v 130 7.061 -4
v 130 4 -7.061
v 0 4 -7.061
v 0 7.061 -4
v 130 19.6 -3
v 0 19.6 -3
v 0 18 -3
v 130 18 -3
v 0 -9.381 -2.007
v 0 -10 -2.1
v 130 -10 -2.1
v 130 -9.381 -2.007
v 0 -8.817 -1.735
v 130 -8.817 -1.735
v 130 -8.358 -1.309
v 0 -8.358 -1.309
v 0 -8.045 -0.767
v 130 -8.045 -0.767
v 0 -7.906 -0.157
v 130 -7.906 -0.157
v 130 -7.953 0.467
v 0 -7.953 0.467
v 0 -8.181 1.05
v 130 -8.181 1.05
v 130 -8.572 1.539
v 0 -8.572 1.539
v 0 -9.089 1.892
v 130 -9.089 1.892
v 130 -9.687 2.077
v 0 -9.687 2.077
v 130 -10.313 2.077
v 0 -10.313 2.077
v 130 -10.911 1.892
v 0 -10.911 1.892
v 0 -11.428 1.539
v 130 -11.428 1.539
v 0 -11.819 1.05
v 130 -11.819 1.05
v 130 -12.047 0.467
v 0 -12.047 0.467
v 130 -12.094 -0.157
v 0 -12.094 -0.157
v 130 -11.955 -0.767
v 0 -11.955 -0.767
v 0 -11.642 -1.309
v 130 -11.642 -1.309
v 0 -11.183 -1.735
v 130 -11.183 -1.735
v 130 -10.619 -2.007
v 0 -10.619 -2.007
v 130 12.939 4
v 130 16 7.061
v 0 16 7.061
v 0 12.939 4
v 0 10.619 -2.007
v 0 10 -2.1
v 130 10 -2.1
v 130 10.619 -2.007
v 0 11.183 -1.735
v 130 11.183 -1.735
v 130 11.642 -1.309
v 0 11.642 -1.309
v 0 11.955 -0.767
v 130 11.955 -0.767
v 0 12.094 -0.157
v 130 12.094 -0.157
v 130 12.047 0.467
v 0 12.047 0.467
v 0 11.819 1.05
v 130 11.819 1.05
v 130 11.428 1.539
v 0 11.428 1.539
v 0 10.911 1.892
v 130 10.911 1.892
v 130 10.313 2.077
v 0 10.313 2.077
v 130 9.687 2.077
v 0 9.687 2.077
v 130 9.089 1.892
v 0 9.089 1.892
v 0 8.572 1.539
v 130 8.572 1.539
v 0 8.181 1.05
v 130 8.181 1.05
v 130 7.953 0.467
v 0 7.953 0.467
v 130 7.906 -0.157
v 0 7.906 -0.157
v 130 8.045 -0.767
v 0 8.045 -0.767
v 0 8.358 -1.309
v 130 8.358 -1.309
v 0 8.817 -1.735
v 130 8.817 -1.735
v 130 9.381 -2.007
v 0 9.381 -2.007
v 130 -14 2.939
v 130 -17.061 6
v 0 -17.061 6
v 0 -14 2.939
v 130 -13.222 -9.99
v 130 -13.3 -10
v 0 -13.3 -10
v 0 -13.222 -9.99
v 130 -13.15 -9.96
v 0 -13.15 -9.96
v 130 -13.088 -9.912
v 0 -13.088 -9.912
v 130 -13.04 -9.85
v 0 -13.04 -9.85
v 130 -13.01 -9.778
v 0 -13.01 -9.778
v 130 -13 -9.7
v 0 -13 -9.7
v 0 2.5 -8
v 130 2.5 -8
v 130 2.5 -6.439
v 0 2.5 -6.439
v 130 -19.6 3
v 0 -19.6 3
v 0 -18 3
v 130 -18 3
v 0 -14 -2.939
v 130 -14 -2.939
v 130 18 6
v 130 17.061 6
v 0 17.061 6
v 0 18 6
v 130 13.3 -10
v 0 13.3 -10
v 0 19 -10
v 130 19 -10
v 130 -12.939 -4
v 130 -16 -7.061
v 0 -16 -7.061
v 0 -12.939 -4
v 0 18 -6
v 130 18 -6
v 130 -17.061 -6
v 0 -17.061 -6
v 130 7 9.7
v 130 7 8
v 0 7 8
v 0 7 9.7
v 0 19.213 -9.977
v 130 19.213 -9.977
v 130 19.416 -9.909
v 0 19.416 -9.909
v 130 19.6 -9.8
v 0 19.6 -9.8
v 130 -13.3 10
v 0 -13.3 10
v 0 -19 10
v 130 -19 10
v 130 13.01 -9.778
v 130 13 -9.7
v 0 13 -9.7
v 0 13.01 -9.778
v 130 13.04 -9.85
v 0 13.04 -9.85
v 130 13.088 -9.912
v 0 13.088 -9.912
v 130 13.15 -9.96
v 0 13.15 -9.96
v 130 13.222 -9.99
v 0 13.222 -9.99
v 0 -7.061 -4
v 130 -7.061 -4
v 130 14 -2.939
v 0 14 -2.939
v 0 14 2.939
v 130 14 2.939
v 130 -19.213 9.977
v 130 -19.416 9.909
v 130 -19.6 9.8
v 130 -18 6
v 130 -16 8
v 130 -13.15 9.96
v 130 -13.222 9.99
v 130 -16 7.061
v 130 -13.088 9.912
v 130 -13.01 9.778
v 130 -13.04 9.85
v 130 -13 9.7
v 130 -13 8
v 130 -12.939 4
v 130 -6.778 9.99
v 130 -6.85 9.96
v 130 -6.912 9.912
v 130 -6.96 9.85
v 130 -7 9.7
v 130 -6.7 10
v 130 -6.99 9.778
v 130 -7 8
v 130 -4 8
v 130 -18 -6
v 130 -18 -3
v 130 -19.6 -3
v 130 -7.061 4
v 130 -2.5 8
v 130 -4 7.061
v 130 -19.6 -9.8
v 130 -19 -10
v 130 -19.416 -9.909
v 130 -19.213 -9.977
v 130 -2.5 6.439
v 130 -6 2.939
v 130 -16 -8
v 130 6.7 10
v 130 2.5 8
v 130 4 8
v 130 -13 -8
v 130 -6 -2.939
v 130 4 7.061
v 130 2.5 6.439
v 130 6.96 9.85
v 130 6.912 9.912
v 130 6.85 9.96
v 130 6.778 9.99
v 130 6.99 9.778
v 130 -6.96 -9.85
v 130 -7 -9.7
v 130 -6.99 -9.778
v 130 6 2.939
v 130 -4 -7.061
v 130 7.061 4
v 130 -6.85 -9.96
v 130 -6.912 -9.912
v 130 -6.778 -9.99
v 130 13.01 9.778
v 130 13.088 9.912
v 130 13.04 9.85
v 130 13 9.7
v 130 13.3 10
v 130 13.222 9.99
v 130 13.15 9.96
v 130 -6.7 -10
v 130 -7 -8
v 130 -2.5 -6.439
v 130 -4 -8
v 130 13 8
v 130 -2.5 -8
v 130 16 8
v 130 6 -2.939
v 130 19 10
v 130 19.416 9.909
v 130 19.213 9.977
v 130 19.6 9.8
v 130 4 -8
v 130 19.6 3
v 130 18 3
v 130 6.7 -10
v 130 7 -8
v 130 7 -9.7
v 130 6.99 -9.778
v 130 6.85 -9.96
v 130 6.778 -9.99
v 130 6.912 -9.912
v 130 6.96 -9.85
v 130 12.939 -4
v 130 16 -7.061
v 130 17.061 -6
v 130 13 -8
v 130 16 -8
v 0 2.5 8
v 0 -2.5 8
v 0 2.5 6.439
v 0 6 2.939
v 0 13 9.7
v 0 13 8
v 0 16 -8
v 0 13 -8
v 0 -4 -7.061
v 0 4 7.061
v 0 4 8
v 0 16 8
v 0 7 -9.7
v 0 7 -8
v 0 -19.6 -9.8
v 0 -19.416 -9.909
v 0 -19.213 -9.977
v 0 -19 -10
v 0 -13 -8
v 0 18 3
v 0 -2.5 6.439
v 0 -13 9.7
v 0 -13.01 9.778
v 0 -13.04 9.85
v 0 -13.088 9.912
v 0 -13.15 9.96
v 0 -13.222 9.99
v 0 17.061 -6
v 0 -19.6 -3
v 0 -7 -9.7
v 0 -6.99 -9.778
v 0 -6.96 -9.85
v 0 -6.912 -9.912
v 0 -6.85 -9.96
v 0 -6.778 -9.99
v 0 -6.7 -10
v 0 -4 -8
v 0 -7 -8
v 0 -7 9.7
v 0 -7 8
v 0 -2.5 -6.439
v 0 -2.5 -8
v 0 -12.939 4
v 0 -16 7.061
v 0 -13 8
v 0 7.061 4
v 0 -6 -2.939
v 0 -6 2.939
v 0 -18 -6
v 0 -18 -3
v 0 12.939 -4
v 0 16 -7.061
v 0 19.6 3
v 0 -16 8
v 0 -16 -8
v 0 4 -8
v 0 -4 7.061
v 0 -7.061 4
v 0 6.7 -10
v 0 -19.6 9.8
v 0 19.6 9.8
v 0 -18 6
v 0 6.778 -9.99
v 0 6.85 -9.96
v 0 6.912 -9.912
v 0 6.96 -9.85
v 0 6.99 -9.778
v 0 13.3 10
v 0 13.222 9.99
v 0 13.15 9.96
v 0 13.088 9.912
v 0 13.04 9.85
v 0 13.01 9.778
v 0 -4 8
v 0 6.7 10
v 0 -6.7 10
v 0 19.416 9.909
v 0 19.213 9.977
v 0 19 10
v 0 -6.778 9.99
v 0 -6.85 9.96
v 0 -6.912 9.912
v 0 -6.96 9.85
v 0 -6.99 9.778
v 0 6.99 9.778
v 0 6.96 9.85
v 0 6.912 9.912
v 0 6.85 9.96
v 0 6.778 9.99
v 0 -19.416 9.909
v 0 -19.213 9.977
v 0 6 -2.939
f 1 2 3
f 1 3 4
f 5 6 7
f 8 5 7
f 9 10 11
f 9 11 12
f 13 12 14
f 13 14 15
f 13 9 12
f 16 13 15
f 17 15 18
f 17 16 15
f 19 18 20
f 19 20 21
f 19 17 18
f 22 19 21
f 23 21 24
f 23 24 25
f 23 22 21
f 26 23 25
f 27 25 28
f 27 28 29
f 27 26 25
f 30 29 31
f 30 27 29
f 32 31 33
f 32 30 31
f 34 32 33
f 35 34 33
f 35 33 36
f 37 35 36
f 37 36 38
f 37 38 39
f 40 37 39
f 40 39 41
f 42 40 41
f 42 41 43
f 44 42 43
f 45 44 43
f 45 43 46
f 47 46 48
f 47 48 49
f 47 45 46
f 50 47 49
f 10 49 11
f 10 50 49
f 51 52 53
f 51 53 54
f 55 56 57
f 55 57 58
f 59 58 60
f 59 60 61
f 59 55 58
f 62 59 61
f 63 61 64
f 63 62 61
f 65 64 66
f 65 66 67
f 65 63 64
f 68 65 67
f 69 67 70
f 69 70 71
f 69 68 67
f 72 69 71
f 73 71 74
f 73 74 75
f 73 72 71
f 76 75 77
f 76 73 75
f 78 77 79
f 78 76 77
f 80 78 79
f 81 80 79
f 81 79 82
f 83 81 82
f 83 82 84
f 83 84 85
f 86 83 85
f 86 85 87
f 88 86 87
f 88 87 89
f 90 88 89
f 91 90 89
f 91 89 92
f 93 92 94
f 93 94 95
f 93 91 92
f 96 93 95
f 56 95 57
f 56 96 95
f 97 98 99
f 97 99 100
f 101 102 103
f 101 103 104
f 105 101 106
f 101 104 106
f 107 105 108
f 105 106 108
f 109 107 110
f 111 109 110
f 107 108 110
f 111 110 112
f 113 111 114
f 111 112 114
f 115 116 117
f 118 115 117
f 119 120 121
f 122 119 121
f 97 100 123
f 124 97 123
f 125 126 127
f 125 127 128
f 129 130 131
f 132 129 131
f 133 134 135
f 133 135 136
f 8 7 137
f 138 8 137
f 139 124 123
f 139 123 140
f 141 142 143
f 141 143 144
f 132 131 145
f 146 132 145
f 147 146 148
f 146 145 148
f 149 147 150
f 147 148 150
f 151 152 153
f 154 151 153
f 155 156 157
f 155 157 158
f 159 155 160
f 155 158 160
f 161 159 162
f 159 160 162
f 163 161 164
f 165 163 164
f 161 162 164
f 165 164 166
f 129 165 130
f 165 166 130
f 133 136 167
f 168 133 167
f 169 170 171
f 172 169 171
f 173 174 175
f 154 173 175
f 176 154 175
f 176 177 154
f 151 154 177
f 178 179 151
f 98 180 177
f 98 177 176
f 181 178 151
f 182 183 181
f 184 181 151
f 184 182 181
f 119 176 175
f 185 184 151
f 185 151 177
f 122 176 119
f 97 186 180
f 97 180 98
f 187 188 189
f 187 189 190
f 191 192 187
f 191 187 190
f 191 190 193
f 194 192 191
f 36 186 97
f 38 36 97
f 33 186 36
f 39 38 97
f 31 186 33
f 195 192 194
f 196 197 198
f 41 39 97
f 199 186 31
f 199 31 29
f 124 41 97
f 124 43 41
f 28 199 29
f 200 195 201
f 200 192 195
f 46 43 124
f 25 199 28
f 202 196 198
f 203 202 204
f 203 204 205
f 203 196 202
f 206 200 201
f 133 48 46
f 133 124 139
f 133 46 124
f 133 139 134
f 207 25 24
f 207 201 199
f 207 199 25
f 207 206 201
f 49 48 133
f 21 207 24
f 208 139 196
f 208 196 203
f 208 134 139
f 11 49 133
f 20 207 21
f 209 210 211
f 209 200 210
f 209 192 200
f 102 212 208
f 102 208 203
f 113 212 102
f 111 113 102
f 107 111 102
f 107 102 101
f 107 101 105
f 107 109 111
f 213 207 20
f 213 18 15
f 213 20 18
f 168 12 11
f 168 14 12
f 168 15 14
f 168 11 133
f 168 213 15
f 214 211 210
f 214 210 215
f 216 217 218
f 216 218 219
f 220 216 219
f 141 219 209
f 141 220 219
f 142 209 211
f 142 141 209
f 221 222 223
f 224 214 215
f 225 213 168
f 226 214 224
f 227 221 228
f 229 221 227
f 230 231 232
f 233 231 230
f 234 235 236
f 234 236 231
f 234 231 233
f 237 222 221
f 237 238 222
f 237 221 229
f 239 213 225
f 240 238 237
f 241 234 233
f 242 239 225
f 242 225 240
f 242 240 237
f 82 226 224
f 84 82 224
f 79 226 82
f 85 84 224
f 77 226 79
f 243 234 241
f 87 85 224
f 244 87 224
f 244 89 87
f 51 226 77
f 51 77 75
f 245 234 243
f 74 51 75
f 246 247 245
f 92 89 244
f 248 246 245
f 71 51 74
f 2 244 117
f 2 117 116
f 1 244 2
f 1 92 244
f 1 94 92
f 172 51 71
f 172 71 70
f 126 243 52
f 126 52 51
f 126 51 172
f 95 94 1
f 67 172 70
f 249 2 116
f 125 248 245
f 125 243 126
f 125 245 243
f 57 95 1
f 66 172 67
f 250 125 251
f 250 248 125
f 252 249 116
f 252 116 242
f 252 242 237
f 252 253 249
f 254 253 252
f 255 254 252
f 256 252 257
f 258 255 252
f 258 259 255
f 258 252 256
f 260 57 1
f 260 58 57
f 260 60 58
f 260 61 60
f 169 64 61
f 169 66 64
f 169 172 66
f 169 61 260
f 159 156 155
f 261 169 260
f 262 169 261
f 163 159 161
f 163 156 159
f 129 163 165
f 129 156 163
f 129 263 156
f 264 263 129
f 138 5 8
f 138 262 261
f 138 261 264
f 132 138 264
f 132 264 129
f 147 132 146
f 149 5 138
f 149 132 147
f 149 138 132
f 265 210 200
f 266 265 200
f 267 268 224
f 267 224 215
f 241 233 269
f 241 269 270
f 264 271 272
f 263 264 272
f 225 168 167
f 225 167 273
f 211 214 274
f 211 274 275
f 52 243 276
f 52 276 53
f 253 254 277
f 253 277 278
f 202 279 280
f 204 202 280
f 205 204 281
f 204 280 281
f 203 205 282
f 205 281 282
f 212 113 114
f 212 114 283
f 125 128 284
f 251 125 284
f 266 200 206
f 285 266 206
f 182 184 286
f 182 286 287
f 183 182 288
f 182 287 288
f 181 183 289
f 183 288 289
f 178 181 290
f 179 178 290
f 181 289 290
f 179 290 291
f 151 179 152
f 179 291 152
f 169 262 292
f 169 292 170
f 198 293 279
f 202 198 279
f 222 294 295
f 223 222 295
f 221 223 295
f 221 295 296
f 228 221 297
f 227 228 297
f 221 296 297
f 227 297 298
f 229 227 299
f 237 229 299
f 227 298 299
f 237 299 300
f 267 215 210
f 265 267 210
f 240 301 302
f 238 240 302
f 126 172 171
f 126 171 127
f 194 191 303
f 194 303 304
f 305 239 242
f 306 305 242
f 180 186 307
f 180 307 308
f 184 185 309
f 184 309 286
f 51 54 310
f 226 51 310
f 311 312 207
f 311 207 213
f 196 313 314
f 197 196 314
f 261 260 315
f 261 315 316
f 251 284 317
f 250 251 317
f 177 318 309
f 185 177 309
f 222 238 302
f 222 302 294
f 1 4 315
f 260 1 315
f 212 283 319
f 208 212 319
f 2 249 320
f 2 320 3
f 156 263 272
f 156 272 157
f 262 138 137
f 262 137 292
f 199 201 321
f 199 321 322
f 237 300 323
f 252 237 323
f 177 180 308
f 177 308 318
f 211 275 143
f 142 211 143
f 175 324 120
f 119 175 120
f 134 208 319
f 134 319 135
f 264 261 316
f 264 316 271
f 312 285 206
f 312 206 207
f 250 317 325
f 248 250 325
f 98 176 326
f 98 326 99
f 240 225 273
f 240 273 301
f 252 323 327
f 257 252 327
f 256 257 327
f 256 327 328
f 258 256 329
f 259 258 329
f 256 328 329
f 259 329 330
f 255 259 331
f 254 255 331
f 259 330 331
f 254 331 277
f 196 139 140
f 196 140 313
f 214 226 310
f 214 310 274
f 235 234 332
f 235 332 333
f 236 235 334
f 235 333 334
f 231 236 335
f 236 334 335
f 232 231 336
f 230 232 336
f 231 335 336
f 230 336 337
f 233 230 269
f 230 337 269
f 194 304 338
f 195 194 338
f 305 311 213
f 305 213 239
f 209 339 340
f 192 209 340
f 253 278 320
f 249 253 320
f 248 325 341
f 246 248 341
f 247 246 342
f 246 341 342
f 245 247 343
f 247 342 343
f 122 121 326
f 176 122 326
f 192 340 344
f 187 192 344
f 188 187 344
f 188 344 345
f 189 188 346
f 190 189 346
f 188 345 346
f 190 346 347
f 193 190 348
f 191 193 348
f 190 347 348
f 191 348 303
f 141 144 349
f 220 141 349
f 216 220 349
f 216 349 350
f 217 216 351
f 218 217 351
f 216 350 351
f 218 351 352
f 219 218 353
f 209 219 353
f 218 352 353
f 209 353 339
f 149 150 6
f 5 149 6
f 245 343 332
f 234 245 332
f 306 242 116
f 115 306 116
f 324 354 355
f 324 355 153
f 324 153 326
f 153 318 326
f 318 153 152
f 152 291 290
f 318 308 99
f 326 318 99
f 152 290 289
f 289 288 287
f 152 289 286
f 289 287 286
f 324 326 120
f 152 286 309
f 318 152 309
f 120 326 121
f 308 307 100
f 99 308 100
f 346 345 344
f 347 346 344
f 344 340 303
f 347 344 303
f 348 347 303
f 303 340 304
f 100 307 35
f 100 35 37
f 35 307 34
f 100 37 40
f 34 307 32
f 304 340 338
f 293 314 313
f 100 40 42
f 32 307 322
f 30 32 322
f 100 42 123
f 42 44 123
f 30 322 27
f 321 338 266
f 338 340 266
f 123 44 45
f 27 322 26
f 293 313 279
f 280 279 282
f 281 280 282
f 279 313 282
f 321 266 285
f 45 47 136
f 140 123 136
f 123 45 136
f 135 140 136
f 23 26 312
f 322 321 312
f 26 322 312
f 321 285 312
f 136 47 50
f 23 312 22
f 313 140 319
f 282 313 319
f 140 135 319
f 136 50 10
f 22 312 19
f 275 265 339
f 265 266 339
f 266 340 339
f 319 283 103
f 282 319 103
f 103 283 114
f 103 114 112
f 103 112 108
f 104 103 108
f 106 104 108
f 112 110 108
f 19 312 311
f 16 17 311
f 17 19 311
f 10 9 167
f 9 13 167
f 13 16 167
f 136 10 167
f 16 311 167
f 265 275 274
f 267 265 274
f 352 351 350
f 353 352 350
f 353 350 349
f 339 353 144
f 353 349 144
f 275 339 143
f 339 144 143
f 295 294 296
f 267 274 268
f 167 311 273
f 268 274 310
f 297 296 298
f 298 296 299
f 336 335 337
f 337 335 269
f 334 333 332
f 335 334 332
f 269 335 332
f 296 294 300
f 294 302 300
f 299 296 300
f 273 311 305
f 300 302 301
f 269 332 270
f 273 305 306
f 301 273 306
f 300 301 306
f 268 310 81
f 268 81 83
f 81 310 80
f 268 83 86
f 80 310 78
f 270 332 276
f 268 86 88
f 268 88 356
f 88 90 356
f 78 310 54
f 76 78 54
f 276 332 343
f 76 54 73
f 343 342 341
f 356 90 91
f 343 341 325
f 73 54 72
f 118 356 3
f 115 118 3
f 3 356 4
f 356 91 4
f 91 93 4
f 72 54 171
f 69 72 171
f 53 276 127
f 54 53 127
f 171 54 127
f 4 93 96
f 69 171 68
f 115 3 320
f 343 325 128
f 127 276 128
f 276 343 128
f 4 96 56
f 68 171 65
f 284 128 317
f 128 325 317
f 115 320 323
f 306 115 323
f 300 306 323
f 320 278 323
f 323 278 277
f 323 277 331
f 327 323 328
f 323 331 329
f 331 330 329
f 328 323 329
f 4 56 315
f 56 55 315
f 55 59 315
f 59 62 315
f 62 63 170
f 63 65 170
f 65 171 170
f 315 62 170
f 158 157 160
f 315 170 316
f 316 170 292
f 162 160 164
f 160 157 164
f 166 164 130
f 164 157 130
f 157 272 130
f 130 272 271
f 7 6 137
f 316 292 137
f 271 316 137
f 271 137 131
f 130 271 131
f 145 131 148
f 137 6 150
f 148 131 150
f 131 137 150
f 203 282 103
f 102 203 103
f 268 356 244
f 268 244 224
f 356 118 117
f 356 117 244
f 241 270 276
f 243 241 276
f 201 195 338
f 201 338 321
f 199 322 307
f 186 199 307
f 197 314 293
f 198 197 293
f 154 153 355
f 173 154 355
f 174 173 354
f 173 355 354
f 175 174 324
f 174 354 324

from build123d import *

# Parameters (mm, degrees)
SKETCH_1_R                   = 2.1
SERI_5_20_40_20X40S5_2_DEPTH = 130


with BuildPart() as part:
    # 草图1 → Seri 5 (20,40) 20X40S5(2) (new body)
    with BuildSketch(Plane(origin=(0, 0, 0), x_dir=(0, 0, -1), z_dir=(1, 0, 0))):
        with BuildLine():
            Line((-10, 19), (-10, 13.3))
            ThreePointArc((-10, 13.3), (-9.912132034, 13.087867966), (-9.7, 13))
            Line((-9.7, 13), (-8, 13))
            Line((-8, 13), (-8, 16))
            Line((-8, 16), (-7.060660172, 16))
            Line((-7.060660172, 16), (-4, 12.939339828))
            Line((-4, 12.939339828), (-4, 7.060660172))
            Line((-4, 7.060660172), (-7.060660172, 4))
            Line((-7.060660172, 4), (-8, 4))
            Line((-8, 4), (-8, 7))
            Line((-8, 7), (-9.7, 7))
            ThreePointArc((-9.7, 7), (-9.912132034, 6.912132034), (-10, 6.7))
            Line((-10, 6.7), (-10, -6.7))
            ThreePointArc((-10, -6.7), (-9.912132034, -6.912132034), (-9.7, -7))
            Line((-9.7, -7), (-8, -7))
            Line((-8, -7), (-8, -4))
            Line((-8, -4), (-7.060660172, -4))
            Line((-7.060660172, -4), (-4, -7.060660172))
            Line((-4, -7.060660172), (-4, -12.939339828))
            Line((-4, -12.939339828), (-7.060660172, -16))
            Line((-7.060660172, -16), (-8, -16))
            Line((-8, -16), (-8, -13))
            Line((-8, -13), (-9.7, -13))
            ThreePointArc((-9.7, -13), (-9.912132034, -13.087867966), (-10, -13.3))
            Line((-10, -13.3), (-10, -19))
            ThreePointArc((-10, -19), (-9.948683298, -19.316227766), (-9.8, -19.6))
            Line((-9.8, -19.6), (-3, -19.6))
            Line((-3, -19.6), (-3, -18))
            Line((-3, -18), (-6, -18))
            Line((-6, -18), (-6, -17.060660172))
            Line((-6, -17.060660172), (-2.939339828, -14))
            Line((-2.939339828, -14), (2.939339828, -14))
            Line((2.939339828, -14), (6, -17.060660172))
            Line((6, -17.060660172), (6, -18))
            Line((6, -18), (3, -18))
            Line((3, -18), (3, -19.6))
            Line((3, -19.6), (9.8, -19.6))
            ThreePointArc((9.8, -19.6), (9.948683298, -19.316227766), (10, -19))
            Line((10, -19), (10, -13.3))
            ThreePointArc((10, -13.3), (9.912132034, -13.087867966), (9.7, -13))
            Line((9.7, -13), (8, -13))
            Line((8, -13), (8, -16))
            Line((8, -16), (7.060660172, -16))
            Line((7.060660172, -16), (4, -12.939339828))
            Line((4, -12.939339828), (4, -7.060660172))
            Line((4, -7.060660172), (7.060660172, -4))
            Line((7.060660172, -4), (8, -4))
            Line((8, -4), (8, -7))
            Line((8, -7), (9.7, -7))
            ThreePointArc((9.7, -7), (9.912132034, -6.912132034), (10, -6.7))
            Line((10, -6.7), (10, 6.7))
            ThreePointArc((10, 6.7), (9.912132034, 6.912132034), (9.7, 7))
            Line((9.7, 7), (8, 7))
            Line((8, 7), (8, 4))
            Line((8, 4), (7.060660172, 4))
            Line((7.060660172, 4), (4, 7.060660172))
            Line((4, 7.060660172), (4, 12.939339828))
            Line((4, 12.939339828), (7.060660172, 16))
            Line((7.060660172, 16), (8, 16))
            Line((8, 16), (8, 13))
            Line((8, 13), (9.7, 13))
            ThreePointArc((9.7, 13), (9.912132034, 13.087867966), (10, 13.3))
            Line((10, 13.3), (10, 19))
            ThreePointArc((10, 19), (9.948683298, 19.316227766), (9.8, 19.6))
            Line((9.8, 19.6), (3, 19.6))
            Line((3, 19.6), (3, 18))
            Line((3, 18), (6, 18))
            Line((6, 18), (6, 17.060660172))
            Line((6, 17.060660172), (2.939339828, 14))
            Line((2.939339828, 14), (-2.939339828, 14))
            Line((-2.939339828, 14), (-6, 17.060660172))
            Line((-6, 17.060660172), (-6, 18))
            Line((-6, 18), (-3, 18))
            Line((-3, 18), (-3, 19.6))
            Line((-3, 19.6), (-9.8, 19.6))
            ThreePointArc((-9.8, 19.6), (-9.948683298, 19.316227766), (-10, 19))
        make_face()
        with Locations((0, -10)):
            Circle(SKETCH_1_R, mode=Mode.SUBTRACT)
        with Locations((0, 10)):
            Circle(SKETCH_1_R, mode=Mode.SUBTRACT)
        Polygon((-8, -2.5), (-6.439339828, -2.5), (-2.939339828, -6), (2.939339828, -6), (6.439339828, -2.5), (8, -2.5), (8, 2.5), (6.439339828, 2.5), (2.939339828, 6), (-2.939339828, 6), (-6.439339828, 2.5), (-8, 2.5), align=None, mode=Mode.SUBTRACT)
    extrude(amount=SERI_5_20_40_20X40S5_2_DEPTH)


solid = part.part
